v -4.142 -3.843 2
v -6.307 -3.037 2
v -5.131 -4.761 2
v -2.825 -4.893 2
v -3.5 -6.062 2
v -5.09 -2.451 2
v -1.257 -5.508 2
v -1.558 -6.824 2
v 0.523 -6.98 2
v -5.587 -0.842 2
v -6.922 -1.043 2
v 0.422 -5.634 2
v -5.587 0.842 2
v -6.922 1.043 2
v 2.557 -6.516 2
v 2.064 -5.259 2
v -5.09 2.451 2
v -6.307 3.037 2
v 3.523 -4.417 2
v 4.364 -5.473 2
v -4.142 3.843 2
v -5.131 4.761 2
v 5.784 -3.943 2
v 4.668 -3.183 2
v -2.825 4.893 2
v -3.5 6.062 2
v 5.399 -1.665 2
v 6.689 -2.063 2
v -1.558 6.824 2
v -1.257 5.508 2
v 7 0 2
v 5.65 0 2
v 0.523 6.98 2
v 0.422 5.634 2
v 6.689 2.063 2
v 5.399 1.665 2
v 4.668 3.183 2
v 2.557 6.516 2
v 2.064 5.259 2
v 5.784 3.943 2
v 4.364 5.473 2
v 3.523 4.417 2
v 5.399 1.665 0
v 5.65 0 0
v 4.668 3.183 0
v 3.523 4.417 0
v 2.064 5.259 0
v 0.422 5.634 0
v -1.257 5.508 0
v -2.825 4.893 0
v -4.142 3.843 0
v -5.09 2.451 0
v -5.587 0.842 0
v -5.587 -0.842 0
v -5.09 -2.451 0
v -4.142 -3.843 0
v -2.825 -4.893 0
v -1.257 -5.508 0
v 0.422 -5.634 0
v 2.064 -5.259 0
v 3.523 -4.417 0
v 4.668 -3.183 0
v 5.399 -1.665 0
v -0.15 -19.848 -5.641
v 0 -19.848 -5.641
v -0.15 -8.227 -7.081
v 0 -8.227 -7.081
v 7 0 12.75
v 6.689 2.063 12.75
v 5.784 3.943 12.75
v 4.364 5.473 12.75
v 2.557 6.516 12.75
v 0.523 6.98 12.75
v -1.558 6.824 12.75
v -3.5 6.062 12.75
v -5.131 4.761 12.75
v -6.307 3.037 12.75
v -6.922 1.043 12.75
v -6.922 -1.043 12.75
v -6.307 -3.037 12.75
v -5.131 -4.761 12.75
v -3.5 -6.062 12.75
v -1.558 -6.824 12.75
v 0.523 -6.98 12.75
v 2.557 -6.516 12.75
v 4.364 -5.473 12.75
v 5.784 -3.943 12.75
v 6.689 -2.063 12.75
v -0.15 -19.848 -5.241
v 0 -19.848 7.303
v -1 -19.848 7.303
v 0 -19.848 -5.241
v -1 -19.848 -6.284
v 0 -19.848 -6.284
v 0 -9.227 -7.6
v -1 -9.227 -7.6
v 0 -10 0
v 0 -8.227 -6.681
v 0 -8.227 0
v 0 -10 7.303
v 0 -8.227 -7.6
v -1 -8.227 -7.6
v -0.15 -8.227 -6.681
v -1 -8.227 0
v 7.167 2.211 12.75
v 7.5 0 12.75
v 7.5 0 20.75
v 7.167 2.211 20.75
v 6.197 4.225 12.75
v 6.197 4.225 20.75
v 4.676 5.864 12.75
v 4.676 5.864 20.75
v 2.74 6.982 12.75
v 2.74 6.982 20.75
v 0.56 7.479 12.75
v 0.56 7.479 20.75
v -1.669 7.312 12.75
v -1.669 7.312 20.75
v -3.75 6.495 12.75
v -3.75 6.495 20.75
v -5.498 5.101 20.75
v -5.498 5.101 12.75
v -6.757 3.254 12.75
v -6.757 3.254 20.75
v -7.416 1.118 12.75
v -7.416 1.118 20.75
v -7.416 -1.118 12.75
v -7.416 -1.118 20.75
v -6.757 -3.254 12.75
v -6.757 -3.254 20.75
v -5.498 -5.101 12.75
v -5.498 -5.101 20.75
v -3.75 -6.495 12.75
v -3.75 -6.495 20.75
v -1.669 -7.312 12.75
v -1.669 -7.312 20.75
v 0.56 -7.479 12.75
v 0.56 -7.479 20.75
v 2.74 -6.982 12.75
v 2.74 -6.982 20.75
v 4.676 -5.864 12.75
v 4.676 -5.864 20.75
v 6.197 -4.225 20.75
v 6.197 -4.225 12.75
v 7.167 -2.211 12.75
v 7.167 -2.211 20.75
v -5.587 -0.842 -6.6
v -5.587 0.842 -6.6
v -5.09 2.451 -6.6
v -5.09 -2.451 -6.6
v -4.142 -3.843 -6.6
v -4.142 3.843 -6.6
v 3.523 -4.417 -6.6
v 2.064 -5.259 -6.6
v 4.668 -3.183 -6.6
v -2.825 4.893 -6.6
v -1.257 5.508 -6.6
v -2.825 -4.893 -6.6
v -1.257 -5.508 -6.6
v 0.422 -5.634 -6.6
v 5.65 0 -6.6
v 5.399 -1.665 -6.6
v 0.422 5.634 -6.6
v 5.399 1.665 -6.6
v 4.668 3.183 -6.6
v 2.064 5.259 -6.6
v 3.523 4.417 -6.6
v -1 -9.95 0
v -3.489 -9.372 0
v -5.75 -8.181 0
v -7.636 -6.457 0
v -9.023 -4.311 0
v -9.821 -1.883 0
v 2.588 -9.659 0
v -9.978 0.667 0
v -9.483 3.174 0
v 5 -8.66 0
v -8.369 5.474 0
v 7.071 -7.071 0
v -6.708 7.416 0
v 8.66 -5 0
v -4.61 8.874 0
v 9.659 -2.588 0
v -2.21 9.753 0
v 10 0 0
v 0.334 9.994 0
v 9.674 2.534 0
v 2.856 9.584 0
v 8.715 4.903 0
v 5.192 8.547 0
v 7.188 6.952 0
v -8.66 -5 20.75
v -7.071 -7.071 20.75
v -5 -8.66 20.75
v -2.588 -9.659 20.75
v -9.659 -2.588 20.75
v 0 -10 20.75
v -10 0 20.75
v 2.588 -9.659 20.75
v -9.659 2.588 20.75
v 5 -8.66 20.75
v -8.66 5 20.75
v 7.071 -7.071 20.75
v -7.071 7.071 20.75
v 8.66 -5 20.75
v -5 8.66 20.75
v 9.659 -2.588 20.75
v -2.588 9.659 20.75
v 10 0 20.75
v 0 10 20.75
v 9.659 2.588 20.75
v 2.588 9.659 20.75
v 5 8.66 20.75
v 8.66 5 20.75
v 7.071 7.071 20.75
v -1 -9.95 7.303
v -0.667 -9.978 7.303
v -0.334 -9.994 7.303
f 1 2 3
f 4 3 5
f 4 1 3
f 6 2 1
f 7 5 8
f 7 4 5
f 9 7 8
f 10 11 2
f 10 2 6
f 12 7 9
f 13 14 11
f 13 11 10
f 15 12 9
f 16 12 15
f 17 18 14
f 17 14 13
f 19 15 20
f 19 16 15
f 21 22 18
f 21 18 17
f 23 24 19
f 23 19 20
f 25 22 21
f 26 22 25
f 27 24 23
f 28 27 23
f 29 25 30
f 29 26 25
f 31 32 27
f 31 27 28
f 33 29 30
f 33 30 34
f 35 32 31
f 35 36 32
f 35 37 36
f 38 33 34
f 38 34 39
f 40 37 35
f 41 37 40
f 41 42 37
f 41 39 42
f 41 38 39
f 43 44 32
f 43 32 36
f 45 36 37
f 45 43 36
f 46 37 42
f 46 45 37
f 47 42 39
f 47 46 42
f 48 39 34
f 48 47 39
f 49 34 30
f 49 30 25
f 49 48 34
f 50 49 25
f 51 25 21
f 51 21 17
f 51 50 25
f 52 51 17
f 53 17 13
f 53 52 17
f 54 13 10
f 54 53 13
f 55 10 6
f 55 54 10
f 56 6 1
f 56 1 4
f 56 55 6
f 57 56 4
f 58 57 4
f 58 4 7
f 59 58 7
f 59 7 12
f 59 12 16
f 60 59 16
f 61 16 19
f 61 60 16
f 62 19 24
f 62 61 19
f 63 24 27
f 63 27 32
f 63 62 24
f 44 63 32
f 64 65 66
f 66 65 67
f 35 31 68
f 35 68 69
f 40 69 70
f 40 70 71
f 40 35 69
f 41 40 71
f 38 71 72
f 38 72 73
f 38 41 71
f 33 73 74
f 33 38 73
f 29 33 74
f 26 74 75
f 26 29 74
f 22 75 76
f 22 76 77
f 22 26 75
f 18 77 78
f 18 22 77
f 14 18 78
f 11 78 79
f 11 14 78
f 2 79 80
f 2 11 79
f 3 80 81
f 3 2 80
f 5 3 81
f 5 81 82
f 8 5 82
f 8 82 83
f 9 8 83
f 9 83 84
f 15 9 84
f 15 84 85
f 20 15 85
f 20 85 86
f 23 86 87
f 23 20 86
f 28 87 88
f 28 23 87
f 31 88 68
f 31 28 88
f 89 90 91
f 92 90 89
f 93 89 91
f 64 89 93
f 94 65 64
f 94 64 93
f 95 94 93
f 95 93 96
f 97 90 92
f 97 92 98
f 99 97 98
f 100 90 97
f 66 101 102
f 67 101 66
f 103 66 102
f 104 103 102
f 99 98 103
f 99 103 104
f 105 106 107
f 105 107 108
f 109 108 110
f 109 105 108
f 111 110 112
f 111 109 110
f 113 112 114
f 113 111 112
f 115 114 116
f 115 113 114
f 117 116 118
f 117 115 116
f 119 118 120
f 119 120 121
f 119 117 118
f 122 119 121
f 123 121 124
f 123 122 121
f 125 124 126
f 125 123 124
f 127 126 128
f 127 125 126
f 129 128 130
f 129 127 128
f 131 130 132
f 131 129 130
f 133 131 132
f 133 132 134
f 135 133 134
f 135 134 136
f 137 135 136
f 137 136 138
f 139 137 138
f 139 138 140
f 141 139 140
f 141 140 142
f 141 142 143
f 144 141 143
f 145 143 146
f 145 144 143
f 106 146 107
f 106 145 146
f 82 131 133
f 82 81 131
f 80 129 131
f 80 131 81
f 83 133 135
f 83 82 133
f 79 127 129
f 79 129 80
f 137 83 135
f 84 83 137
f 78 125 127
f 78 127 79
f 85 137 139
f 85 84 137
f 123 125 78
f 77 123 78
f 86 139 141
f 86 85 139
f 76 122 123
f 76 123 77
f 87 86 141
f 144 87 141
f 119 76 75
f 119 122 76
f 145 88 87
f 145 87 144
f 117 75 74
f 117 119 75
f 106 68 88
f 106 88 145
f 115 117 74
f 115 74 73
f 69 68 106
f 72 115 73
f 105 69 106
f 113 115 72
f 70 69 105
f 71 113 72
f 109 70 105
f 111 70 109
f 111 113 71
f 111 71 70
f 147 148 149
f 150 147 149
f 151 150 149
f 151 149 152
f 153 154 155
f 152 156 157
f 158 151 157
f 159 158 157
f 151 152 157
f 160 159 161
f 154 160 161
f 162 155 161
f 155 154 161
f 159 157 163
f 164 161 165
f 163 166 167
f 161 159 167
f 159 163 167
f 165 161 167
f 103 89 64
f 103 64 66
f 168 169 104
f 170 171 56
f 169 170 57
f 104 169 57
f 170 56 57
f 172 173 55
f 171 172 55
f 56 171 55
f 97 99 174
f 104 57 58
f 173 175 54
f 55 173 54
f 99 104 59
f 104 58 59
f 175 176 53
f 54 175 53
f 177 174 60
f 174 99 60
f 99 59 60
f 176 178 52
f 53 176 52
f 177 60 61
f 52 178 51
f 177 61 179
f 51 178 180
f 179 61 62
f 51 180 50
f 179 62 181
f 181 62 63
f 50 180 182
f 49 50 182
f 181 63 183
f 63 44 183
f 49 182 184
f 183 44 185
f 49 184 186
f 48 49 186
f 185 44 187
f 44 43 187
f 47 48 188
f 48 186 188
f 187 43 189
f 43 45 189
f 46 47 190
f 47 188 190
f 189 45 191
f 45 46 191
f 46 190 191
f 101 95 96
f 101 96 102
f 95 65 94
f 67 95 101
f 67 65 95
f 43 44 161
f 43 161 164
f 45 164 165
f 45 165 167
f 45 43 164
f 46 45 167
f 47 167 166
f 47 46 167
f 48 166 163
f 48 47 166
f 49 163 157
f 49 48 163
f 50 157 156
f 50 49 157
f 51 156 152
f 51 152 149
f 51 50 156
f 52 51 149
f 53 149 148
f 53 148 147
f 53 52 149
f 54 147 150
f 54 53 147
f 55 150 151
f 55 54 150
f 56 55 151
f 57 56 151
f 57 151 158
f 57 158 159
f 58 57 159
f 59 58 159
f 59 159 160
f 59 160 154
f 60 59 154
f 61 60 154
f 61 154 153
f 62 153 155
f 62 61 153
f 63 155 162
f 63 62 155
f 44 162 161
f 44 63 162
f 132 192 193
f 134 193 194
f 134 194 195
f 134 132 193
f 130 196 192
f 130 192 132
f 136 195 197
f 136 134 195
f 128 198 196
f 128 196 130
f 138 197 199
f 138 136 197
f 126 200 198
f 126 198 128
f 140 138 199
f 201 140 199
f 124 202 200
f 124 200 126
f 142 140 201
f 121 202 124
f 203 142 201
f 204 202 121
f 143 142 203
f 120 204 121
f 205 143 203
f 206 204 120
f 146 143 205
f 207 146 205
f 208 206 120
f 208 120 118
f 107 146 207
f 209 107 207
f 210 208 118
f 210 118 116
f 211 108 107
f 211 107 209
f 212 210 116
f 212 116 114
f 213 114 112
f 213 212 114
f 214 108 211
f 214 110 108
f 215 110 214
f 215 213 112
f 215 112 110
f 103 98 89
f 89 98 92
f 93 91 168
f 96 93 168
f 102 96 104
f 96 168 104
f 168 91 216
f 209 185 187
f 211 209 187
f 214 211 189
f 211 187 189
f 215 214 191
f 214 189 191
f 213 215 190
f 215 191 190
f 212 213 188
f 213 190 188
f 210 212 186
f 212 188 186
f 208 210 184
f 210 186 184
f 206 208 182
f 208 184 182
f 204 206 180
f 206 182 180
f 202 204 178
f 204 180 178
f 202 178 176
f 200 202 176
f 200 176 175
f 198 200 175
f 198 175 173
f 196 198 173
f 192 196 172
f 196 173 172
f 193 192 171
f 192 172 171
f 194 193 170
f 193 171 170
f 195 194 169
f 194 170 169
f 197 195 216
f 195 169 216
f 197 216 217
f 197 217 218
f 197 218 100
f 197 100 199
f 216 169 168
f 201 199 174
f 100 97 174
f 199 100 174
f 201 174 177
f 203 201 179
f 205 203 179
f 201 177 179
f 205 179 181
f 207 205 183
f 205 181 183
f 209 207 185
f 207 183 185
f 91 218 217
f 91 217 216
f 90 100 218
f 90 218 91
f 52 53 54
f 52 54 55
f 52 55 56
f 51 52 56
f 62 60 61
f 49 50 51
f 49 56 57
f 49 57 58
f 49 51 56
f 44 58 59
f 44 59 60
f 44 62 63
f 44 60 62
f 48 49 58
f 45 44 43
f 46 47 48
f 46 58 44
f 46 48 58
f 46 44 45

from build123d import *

# Parameters (mm, degrees)
F0_R     = 10
F0_R_2   = 5.65
F1_DEPTH = 2
F2_R     = 10
F2_R_2   = 7
F3_DEPTH = 10.75
F4_R     = 10
F4_R_2   = 7.5
F5_DEPTH = 8
F6_DEPTH = 6.6
F8_DEPTH = 1
F9_DEPTH = 0.15


# Not quite as in the source:
# - a feature names something its author has since deleted; it is built from what else it names


with BuildPart() as f1:
    # F0 (on Top) → F1 (new body)
    with BuildSketch(Plane.XY):
        Circle(F0_R)
        Circle(F0_R_2, mode=Mode.SUBTRACT)
    extrude(amount=F1_DEPTH)

    # F2 (on face) → F3 (join)
    with BuildSketch(Plane.XY.offset(2)):
        Circle(F2_R)
        Circle(F2_R_2, mode=Mode.SUBTRACT)
    extrude(amount=F3_DEPTH)

    # F4 (on face) → F5 (join)
    with BuildSketch(Plane.XY.offset(12.75)):
        Circle(F4_R)
        Circle(F4_R_2, mode=Mode.SUBTRACT)
    extrude(amount=F5_DEPTH)

    # F7 (on Right) → F8 (join)
    with BuildSketch(Plane.YZ):
        Polygon((-19.8482480398, -5.2409250216), (-8.2270988125, -6.6807134215), (-8.2270988125, 1.9598644681), (-8.2270988125, 7.3028788902), (-19.8482480398, 7.3028788902), align=None)
        Polygon((-9.2270988125, -7.6), (-8.2270988125, -7.6), (-8.2270988125, -7.0807134215), (-19.8482480398, -5.6409250216), (-19.8482480398, -6.2841054055), align=None)
        Polygon((-19.8482480398, -5.4409250216), (-8.2270988125, -6.8807134215), (-8.2270988125, -6.6807134215), (-19.8482480398, -5.2409250216), align=None)
        Polygon((-19.8482480398, -5.6409250216), (-8.2270988125, -7.0807134215), (-8.2270988125, -6.8807134215), (-19.8482480398, -5.4409250216), align=None)
    extrude(amount=-F8_DEPTH)

    # F7 (on Right) → F9 (cut)
    with BuildSketch(Plane.YZ):
        Polygon((-19.8482480398, -5.4409250216), (-8.2270988125, -6.8807134215), (-8.2270988125, -6.6807134215), (-19.8482480398, -5.2409250216), align=None)
        Polygon((-19.8482480398, -5.6409250216), (-8.2270988125, -7.0807134215), (-8.2270988125, -6.8807134215), (-19.8482480398, -5.4409250216), align=None)
    extrude(amount=-F9_DEPTH, mode=Mode.SUBTRACT)


with BuildPart() as f6:
    # F0 (on Top) → F6 (new body)
    with BuildSketch(Plane.XY):
        Circle(F0_R_2)
    extrude(amount=-F6_DEPTH)


solid = Compound([f1.part, f6.part])
